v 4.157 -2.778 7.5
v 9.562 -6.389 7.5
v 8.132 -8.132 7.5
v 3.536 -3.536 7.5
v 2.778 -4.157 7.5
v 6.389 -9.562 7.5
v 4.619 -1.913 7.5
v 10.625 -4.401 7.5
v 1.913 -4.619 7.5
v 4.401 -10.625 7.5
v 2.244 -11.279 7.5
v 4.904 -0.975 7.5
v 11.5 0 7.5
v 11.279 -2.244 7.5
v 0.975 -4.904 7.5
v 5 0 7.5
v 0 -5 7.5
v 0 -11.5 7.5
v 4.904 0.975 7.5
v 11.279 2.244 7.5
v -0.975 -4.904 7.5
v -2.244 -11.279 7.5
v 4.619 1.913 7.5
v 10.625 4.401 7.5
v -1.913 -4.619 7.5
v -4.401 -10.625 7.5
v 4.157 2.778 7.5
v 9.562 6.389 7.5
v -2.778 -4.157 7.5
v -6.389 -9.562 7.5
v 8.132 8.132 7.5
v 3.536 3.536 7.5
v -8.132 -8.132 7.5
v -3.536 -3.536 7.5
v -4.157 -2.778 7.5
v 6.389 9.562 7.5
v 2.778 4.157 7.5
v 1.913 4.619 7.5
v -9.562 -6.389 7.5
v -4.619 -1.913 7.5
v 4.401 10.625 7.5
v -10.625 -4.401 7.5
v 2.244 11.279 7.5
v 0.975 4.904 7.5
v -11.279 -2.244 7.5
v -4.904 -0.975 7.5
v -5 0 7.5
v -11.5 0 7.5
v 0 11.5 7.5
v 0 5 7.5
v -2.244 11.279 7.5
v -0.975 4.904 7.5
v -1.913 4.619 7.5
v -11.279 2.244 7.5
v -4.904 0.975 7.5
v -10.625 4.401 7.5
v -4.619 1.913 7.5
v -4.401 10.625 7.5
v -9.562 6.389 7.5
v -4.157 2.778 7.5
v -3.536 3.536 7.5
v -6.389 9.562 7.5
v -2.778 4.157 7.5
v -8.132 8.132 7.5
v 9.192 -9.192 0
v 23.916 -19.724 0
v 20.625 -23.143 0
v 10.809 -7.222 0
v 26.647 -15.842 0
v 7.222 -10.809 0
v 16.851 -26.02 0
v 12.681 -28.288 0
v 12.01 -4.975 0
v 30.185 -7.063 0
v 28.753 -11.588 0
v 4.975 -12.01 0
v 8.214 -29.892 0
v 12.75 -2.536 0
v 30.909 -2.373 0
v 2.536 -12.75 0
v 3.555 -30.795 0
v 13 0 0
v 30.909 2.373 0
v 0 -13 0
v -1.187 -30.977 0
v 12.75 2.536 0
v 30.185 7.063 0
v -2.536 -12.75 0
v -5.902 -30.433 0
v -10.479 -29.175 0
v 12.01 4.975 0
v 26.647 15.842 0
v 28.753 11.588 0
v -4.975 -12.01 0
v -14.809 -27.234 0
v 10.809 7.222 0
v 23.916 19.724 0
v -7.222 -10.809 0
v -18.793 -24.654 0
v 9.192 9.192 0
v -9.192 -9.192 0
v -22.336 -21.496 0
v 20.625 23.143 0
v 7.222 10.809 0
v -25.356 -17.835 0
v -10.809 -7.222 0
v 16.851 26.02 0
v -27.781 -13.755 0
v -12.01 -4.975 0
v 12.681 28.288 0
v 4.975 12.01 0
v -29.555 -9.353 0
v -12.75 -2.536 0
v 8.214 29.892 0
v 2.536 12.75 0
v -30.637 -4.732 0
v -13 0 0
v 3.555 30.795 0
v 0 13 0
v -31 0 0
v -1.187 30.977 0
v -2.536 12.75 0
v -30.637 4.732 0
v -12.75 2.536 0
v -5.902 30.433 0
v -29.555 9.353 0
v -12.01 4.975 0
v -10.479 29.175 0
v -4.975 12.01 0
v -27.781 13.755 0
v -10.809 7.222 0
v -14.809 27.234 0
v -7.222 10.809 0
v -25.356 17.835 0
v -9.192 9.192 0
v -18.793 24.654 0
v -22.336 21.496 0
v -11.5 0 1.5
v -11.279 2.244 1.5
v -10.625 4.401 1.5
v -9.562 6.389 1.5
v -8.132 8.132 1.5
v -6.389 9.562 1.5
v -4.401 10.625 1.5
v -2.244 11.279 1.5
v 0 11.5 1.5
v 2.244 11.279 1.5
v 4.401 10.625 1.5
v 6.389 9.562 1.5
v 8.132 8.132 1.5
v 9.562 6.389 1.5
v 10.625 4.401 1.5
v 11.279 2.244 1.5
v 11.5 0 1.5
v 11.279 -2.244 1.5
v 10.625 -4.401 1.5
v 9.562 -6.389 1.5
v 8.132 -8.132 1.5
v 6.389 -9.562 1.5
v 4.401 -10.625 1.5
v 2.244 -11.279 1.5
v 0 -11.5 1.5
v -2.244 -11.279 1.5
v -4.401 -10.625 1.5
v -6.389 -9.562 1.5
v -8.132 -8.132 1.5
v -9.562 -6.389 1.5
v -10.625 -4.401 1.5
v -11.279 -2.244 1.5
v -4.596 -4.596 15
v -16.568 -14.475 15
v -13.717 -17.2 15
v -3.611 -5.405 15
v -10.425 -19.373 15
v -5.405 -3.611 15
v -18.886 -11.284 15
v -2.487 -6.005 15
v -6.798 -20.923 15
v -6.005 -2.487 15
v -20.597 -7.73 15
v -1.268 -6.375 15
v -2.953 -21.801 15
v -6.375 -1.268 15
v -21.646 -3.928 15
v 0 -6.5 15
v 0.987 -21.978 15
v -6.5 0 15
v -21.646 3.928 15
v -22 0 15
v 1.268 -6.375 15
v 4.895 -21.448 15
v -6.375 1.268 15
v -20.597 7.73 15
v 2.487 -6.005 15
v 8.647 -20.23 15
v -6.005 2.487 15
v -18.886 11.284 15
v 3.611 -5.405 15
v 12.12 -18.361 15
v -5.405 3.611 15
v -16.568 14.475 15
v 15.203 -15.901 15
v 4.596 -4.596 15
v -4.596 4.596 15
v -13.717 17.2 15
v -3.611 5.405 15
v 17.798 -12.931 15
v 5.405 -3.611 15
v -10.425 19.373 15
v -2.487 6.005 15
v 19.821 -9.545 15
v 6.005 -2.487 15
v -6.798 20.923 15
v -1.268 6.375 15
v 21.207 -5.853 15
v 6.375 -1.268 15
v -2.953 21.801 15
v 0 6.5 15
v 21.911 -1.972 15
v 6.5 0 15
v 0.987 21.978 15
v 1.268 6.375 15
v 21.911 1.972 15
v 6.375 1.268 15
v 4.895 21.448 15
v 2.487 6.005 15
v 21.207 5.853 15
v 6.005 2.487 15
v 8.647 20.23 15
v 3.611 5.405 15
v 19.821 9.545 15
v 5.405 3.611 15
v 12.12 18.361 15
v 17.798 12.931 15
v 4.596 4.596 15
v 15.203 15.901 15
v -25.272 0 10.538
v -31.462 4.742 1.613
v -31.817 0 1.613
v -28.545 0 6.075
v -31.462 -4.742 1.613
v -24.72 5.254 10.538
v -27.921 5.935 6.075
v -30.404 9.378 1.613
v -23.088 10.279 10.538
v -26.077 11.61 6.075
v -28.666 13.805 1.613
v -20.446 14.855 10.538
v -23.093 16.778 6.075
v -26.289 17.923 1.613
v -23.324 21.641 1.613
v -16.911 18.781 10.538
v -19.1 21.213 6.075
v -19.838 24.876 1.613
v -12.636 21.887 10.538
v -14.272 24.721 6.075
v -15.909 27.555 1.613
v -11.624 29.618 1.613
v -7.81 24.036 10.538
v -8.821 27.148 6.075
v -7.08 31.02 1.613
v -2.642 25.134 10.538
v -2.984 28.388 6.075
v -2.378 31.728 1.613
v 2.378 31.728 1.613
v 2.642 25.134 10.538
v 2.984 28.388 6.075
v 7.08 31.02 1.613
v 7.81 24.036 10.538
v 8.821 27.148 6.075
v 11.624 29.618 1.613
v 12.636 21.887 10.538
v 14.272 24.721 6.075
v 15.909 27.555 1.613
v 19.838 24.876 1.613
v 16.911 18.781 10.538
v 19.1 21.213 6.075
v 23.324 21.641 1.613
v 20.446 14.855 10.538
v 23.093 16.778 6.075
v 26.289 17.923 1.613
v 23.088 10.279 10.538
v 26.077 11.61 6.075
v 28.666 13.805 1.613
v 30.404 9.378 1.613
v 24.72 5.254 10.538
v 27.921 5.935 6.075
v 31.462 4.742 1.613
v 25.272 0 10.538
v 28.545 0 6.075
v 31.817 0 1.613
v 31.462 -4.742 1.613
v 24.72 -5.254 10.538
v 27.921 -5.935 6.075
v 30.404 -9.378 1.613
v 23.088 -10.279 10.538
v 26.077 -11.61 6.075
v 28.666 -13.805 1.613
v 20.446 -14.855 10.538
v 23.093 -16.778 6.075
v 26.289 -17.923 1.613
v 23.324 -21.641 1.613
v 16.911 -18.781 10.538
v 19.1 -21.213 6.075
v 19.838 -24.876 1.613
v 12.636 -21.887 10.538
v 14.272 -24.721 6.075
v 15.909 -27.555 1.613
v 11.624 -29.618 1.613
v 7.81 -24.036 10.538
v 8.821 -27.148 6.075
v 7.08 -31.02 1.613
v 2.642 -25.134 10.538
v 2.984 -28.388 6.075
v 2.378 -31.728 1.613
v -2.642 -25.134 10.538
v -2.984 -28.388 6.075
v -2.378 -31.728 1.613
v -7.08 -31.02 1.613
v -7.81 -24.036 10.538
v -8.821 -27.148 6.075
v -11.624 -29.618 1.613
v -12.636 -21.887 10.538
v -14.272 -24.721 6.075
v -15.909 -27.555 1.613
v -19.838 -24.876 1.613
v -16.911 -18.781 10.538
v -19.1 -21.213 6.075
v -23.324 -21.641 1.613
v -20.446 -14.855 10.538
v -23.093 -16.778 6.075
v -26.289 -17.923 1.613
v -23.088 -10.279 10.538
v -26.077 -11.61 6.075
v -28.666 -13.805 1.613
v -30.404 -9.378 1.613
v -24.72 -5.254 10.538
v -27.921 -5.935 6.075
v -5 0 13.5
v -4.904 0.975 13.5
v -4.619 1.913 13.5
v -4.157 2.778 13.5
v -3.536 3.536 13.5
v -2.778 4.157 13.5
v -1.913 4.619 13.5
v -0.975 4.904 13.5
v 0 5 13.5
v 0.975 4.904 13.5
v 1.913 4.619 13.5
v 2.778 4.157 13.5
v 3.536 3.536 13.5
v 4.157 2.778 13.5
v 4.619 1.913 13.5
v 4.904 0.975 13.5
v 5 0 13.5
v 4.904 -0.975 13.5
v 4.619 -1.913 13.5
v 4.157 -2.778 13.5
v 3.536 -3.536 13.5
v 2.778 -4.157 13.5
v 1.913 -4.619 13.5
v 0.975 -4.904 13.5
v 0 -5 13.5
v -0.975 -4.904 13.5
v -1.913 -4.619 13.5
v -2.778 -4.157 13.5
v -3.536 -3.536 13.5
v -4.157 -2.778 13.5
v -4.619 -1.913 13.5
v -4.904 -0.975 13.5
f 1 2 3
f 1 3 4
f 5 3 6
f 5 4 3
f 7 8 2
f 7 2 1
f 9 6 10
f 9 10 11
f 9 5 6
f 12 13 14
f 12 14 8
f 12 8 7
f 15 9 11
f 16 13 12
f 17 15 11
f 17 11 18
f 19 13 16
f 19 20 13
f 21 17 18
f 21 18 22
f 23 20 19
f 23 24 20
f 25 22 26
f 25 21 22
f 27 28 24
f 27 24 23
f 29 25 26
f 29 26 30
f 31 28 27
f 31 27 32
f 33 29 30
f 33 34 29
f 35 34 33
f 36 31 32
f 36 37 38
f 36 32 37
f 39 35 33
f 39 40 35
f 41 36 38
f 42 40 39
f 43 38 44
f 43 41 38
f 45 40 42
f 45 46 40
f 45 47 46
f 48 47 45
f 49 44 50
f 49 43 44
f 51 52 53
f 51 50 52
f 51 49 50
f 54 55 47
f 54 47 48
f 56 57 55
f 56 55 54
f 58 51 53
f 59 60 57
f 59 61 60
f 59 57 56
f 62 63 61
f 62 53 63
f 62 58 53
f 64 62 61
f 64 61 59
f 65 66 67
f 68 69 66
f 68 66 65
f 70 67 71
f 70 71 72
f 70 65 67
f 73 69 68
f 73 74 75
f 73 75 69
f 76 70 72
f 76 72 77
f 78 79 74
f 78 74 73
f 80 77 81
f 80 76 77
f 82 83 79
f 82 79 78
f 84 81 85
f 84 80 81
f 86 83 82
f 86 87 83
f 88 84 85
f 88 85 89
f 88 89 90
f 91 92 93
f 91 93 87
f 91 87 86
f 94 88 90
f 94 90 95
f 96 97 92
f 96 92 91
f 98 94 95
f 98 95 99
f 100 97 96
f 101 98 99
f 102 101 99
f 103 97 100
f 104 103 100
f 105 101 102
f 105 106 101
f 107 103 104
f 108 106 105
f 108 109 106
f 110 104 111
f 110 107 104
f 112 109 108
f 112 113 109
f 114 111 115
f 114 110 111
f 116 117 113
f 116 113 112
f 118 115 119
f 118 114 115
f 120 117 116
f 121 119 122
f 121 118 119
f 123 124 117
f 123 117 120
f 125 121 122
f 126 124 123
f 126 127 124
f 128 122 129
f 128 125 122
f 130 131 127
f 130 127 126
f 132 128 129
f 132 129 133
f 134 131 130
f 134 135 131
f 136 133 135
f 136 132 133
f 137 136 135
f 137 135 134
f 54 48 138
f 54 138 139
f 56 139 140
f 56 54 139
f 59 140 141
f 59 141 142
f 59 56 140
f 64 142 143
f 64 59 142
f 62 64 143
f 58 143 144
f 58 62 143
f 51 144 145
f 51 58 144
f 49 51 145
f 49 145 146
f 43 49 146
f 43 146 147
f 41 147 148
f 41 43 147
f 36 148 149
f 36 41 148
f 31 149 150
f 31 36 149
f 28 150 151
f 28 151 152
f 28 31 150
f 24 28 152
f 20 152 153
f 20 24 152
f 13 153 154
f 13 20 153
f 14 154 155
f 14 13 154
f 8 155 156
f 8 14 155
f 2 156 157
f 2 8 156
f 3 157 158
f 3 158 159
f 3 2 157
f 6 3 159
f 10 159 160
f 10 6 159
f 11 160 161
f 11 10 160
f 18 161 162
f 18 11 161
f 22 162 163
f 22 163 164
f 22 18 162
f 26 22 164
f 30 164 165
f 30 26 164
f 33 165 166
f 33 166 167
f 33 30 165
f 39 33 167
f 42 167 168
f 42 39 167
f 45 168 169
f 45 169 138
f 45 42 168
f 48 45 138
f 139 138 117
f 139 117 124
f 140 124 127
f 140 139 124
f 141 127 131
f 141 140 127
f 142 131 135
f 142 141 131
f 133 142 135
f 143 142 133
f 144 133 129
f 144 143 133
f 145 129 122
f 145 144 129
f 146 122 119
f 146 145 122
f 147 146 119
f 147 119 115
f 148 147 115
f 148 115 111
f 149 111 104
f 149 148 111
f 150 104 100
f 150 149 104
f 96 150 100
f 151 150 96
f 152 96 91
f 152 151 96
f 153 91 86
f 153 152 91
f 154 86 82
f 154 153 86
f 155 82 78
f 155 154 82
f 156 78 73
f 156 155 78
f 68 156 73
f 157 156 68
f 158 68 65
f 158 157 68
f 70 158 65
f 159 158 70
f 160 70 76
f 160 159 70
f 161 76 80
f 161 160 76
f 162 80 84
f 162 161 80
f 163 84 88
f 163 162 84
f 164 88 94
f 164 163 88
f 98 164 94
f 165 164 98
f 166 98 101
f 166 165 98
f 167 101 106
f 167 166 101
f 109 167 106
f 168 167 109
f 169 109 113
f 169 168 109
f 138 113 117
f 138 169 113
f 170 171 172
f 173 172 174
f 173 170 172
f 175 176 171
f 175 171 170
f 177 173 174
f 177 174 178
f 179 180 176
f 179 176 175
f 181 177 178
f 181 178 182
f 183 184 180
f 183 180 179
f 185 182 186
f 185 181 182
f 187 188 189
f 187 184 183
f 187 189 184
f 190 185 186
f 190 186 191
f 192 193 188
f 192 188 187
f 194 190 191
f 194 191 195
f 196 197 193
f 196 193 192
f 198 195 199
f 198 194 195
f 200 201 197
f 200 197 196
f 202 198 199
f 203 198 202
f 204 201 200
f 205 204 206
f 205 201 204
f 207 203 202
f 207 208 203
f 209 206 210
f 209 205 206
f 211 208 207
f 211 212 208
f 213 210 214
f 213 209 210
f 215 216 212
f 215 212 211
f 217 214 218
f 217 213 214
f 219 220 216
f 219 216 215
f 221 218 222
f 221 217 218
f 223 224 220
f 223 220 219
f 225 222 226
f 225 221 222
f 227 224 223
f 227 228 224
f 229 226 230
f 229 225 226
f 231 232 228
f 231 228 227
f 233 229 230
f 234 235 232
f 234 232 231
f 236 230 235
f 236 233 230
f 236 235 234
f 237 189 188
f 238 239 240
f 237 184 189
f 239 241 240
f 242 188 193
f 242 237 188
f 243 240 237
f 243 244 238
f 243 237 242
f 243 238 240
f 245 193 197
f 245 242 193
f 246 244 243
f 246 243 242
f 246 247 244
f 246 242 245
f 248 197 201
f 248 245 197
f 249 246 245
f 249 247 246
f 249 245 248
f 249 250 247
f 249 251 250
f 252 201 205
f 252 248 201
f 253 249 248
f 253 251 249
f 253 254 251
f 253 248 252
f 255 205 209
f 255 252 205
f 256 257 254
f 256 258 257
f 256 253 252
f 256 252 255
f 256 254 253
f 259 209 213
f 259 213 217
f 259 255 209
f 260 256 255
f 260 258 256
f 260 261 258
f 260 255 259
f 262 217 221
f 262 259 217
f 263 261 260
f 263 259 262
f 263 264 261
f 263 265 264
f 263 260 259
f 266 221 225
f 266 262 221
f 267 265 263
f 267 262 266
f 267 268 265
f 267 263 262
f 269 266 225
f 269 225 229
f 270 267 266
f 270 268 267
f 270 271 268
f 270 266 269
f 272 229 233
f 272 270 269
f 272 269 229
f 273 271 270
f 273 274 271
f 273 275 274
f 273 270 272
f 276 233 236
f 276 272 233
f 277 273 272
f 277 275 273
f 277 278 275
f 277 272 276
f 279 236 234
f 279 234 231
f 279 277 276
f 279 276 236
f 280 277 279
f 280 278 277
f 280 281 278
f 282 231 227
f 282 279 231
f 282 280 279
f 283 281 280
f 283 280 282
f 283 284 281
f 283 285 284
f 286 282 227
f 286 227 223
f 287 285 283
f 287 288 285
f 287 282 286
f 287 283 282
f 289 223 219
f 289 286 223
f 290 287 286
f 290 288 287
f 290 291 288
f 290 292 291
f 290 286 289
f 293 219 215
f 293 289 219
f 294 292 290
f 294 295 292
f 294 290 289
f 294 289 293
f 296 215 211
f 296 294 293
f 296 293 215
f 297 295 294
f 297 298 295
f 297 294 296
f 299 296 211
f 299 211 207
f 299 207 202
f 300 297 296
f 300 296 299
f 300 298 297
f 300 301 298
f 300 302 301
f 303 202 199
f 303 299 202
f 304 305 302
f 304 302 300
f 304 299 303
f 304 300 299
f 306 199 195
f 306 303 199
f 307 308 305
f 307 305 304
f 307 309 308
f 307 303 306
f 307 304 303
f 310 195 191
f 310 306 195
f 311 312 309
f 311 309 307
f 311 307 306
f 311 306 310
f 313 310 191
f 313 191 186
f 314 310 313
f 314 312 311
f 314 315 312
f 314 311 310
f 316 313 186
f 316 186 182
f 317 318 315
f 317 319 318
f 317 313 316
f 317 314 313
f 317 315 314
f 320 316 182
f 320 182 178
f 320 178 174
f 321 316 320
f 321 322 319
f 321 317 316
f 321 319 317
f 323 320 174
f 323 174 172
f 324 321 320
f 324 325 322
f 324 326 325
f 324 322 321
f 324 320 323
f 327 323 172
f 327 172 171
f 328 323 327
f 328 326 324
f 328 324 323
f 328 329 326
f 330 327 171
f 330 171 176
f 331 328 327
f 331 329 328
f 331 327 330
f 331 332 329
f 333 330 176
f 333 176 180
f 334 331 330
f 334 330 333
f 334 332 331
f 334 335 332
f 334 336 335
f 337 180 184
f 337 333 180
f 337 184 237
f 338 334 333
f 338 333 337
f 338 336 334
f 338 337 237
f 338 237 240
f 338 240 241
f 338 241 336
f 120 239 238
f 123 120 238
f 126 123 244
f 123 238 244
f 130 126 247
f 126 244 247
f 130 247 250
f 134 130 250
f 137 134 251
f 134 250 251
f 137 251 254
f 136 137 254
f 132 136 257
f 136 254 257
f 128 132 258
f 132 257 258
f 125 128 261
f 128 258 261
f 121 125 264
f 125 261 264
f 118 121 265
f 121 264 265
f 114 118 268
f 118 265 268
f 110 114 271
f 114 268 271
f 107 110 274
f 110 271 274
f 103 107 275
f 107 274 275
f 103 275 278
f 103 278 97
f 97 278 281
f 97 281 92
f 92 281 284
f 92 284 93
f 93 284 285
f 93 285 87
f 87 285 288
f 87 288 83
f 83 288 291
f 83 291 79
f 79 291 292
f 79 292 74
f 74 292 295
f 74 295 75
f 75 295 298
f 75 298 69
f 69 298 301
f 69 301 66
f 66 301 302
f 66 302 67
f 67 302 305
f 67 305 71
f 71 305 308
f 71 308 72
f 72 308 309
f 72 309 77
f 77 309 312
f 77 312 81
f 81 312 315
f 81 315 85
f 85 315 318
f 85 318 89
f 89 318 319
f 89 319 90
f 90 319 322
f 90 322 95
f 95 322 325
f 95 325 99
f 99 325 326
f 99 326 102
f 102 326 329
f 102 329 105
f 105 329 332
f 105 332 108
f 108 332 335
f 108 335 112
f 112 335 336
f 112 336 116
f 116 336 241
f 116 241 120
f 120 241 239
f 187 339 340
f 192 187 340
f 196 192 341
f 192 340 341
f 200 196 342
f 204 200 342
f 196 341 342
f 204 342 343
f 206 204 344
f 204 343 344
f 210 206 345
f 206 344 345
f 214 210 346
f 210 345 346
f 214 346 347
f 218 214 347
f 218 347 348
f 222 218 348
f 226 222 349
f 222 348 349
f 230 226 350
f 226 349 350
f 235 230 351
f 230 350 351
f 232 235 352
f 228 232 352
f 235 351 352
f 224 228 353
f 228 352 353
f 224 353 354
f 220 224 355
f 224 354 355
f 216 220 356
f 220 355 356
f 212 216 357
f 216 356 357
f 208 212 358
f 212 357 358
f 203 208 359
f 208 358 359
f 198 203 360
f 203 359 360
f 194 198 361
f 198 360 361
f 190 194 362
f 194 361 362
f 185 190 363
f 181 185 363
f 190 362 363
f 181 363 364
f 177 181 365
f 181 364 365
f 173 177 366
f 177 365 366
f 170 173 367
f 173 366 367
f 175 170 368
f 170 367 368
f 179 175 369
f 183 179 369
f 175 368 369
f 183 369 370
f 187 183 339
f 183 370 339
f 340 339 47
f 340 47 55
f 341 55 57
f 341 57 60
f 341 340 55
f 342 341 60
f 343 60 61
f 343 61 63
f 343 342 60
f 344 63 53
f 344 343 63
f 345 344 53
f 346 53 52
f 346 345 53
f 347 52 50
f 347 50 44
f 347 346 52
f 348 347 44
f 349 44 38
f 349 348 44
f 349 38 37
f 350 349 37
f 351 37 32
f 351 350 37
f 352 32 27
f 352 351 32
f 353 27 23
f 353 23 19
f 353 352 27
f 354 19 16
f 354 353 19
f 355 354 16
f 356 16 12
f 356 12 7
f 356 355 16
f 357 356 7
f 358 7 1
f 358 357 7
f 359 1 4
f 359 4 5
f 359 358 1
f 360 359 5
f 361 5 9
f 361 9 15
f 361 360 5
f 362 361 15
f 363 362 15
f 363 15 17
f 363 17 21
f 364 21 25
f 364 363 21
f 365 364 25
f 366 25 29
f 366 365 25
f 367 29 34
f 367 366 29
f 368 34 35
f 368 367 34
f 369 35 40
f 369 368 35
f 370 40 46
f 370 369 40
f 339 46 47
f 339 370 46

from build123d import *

# Parameters (mm, degrees)
F2_SIZE = 2
F3_SIZE = 1.5
F4_SIZE = 1.5


with BuildPart() as f1:
    # F0 (on Front) → F1 (revolve)
    with BuildSketch(Plane.XZ):
        Polygon((-33, 0), (-11.5, 0), (-11.5, 7.5), (-5, 7.5), (-5, 15), (-22, 15), align=None)
    revolve(axis=Axis((0, 0, 3.75), (0, 0, -1)))

    # F2
    f2_edges = [f1.edges().sort_by_distance(p)[0] for p in [
        (33, 0, 0),
    ]]
    chamfer(f2_edges, length=F2_SIZE)

    # F3
    f3_edges = [f1.edges().sort_by_distance(p)[0] for p in [
        (5, 0, 15),
    ]]
    chamfer(f3_edges, length=F3_SIZE)

    # F4
    f4_edges = [f1.edges().sort_by_distance(p)[0] for p in [
        (11.5, 0, 0),
    ]]
    chamfer(f4_edges, length=F4_SIZE)


solid = f1.part
